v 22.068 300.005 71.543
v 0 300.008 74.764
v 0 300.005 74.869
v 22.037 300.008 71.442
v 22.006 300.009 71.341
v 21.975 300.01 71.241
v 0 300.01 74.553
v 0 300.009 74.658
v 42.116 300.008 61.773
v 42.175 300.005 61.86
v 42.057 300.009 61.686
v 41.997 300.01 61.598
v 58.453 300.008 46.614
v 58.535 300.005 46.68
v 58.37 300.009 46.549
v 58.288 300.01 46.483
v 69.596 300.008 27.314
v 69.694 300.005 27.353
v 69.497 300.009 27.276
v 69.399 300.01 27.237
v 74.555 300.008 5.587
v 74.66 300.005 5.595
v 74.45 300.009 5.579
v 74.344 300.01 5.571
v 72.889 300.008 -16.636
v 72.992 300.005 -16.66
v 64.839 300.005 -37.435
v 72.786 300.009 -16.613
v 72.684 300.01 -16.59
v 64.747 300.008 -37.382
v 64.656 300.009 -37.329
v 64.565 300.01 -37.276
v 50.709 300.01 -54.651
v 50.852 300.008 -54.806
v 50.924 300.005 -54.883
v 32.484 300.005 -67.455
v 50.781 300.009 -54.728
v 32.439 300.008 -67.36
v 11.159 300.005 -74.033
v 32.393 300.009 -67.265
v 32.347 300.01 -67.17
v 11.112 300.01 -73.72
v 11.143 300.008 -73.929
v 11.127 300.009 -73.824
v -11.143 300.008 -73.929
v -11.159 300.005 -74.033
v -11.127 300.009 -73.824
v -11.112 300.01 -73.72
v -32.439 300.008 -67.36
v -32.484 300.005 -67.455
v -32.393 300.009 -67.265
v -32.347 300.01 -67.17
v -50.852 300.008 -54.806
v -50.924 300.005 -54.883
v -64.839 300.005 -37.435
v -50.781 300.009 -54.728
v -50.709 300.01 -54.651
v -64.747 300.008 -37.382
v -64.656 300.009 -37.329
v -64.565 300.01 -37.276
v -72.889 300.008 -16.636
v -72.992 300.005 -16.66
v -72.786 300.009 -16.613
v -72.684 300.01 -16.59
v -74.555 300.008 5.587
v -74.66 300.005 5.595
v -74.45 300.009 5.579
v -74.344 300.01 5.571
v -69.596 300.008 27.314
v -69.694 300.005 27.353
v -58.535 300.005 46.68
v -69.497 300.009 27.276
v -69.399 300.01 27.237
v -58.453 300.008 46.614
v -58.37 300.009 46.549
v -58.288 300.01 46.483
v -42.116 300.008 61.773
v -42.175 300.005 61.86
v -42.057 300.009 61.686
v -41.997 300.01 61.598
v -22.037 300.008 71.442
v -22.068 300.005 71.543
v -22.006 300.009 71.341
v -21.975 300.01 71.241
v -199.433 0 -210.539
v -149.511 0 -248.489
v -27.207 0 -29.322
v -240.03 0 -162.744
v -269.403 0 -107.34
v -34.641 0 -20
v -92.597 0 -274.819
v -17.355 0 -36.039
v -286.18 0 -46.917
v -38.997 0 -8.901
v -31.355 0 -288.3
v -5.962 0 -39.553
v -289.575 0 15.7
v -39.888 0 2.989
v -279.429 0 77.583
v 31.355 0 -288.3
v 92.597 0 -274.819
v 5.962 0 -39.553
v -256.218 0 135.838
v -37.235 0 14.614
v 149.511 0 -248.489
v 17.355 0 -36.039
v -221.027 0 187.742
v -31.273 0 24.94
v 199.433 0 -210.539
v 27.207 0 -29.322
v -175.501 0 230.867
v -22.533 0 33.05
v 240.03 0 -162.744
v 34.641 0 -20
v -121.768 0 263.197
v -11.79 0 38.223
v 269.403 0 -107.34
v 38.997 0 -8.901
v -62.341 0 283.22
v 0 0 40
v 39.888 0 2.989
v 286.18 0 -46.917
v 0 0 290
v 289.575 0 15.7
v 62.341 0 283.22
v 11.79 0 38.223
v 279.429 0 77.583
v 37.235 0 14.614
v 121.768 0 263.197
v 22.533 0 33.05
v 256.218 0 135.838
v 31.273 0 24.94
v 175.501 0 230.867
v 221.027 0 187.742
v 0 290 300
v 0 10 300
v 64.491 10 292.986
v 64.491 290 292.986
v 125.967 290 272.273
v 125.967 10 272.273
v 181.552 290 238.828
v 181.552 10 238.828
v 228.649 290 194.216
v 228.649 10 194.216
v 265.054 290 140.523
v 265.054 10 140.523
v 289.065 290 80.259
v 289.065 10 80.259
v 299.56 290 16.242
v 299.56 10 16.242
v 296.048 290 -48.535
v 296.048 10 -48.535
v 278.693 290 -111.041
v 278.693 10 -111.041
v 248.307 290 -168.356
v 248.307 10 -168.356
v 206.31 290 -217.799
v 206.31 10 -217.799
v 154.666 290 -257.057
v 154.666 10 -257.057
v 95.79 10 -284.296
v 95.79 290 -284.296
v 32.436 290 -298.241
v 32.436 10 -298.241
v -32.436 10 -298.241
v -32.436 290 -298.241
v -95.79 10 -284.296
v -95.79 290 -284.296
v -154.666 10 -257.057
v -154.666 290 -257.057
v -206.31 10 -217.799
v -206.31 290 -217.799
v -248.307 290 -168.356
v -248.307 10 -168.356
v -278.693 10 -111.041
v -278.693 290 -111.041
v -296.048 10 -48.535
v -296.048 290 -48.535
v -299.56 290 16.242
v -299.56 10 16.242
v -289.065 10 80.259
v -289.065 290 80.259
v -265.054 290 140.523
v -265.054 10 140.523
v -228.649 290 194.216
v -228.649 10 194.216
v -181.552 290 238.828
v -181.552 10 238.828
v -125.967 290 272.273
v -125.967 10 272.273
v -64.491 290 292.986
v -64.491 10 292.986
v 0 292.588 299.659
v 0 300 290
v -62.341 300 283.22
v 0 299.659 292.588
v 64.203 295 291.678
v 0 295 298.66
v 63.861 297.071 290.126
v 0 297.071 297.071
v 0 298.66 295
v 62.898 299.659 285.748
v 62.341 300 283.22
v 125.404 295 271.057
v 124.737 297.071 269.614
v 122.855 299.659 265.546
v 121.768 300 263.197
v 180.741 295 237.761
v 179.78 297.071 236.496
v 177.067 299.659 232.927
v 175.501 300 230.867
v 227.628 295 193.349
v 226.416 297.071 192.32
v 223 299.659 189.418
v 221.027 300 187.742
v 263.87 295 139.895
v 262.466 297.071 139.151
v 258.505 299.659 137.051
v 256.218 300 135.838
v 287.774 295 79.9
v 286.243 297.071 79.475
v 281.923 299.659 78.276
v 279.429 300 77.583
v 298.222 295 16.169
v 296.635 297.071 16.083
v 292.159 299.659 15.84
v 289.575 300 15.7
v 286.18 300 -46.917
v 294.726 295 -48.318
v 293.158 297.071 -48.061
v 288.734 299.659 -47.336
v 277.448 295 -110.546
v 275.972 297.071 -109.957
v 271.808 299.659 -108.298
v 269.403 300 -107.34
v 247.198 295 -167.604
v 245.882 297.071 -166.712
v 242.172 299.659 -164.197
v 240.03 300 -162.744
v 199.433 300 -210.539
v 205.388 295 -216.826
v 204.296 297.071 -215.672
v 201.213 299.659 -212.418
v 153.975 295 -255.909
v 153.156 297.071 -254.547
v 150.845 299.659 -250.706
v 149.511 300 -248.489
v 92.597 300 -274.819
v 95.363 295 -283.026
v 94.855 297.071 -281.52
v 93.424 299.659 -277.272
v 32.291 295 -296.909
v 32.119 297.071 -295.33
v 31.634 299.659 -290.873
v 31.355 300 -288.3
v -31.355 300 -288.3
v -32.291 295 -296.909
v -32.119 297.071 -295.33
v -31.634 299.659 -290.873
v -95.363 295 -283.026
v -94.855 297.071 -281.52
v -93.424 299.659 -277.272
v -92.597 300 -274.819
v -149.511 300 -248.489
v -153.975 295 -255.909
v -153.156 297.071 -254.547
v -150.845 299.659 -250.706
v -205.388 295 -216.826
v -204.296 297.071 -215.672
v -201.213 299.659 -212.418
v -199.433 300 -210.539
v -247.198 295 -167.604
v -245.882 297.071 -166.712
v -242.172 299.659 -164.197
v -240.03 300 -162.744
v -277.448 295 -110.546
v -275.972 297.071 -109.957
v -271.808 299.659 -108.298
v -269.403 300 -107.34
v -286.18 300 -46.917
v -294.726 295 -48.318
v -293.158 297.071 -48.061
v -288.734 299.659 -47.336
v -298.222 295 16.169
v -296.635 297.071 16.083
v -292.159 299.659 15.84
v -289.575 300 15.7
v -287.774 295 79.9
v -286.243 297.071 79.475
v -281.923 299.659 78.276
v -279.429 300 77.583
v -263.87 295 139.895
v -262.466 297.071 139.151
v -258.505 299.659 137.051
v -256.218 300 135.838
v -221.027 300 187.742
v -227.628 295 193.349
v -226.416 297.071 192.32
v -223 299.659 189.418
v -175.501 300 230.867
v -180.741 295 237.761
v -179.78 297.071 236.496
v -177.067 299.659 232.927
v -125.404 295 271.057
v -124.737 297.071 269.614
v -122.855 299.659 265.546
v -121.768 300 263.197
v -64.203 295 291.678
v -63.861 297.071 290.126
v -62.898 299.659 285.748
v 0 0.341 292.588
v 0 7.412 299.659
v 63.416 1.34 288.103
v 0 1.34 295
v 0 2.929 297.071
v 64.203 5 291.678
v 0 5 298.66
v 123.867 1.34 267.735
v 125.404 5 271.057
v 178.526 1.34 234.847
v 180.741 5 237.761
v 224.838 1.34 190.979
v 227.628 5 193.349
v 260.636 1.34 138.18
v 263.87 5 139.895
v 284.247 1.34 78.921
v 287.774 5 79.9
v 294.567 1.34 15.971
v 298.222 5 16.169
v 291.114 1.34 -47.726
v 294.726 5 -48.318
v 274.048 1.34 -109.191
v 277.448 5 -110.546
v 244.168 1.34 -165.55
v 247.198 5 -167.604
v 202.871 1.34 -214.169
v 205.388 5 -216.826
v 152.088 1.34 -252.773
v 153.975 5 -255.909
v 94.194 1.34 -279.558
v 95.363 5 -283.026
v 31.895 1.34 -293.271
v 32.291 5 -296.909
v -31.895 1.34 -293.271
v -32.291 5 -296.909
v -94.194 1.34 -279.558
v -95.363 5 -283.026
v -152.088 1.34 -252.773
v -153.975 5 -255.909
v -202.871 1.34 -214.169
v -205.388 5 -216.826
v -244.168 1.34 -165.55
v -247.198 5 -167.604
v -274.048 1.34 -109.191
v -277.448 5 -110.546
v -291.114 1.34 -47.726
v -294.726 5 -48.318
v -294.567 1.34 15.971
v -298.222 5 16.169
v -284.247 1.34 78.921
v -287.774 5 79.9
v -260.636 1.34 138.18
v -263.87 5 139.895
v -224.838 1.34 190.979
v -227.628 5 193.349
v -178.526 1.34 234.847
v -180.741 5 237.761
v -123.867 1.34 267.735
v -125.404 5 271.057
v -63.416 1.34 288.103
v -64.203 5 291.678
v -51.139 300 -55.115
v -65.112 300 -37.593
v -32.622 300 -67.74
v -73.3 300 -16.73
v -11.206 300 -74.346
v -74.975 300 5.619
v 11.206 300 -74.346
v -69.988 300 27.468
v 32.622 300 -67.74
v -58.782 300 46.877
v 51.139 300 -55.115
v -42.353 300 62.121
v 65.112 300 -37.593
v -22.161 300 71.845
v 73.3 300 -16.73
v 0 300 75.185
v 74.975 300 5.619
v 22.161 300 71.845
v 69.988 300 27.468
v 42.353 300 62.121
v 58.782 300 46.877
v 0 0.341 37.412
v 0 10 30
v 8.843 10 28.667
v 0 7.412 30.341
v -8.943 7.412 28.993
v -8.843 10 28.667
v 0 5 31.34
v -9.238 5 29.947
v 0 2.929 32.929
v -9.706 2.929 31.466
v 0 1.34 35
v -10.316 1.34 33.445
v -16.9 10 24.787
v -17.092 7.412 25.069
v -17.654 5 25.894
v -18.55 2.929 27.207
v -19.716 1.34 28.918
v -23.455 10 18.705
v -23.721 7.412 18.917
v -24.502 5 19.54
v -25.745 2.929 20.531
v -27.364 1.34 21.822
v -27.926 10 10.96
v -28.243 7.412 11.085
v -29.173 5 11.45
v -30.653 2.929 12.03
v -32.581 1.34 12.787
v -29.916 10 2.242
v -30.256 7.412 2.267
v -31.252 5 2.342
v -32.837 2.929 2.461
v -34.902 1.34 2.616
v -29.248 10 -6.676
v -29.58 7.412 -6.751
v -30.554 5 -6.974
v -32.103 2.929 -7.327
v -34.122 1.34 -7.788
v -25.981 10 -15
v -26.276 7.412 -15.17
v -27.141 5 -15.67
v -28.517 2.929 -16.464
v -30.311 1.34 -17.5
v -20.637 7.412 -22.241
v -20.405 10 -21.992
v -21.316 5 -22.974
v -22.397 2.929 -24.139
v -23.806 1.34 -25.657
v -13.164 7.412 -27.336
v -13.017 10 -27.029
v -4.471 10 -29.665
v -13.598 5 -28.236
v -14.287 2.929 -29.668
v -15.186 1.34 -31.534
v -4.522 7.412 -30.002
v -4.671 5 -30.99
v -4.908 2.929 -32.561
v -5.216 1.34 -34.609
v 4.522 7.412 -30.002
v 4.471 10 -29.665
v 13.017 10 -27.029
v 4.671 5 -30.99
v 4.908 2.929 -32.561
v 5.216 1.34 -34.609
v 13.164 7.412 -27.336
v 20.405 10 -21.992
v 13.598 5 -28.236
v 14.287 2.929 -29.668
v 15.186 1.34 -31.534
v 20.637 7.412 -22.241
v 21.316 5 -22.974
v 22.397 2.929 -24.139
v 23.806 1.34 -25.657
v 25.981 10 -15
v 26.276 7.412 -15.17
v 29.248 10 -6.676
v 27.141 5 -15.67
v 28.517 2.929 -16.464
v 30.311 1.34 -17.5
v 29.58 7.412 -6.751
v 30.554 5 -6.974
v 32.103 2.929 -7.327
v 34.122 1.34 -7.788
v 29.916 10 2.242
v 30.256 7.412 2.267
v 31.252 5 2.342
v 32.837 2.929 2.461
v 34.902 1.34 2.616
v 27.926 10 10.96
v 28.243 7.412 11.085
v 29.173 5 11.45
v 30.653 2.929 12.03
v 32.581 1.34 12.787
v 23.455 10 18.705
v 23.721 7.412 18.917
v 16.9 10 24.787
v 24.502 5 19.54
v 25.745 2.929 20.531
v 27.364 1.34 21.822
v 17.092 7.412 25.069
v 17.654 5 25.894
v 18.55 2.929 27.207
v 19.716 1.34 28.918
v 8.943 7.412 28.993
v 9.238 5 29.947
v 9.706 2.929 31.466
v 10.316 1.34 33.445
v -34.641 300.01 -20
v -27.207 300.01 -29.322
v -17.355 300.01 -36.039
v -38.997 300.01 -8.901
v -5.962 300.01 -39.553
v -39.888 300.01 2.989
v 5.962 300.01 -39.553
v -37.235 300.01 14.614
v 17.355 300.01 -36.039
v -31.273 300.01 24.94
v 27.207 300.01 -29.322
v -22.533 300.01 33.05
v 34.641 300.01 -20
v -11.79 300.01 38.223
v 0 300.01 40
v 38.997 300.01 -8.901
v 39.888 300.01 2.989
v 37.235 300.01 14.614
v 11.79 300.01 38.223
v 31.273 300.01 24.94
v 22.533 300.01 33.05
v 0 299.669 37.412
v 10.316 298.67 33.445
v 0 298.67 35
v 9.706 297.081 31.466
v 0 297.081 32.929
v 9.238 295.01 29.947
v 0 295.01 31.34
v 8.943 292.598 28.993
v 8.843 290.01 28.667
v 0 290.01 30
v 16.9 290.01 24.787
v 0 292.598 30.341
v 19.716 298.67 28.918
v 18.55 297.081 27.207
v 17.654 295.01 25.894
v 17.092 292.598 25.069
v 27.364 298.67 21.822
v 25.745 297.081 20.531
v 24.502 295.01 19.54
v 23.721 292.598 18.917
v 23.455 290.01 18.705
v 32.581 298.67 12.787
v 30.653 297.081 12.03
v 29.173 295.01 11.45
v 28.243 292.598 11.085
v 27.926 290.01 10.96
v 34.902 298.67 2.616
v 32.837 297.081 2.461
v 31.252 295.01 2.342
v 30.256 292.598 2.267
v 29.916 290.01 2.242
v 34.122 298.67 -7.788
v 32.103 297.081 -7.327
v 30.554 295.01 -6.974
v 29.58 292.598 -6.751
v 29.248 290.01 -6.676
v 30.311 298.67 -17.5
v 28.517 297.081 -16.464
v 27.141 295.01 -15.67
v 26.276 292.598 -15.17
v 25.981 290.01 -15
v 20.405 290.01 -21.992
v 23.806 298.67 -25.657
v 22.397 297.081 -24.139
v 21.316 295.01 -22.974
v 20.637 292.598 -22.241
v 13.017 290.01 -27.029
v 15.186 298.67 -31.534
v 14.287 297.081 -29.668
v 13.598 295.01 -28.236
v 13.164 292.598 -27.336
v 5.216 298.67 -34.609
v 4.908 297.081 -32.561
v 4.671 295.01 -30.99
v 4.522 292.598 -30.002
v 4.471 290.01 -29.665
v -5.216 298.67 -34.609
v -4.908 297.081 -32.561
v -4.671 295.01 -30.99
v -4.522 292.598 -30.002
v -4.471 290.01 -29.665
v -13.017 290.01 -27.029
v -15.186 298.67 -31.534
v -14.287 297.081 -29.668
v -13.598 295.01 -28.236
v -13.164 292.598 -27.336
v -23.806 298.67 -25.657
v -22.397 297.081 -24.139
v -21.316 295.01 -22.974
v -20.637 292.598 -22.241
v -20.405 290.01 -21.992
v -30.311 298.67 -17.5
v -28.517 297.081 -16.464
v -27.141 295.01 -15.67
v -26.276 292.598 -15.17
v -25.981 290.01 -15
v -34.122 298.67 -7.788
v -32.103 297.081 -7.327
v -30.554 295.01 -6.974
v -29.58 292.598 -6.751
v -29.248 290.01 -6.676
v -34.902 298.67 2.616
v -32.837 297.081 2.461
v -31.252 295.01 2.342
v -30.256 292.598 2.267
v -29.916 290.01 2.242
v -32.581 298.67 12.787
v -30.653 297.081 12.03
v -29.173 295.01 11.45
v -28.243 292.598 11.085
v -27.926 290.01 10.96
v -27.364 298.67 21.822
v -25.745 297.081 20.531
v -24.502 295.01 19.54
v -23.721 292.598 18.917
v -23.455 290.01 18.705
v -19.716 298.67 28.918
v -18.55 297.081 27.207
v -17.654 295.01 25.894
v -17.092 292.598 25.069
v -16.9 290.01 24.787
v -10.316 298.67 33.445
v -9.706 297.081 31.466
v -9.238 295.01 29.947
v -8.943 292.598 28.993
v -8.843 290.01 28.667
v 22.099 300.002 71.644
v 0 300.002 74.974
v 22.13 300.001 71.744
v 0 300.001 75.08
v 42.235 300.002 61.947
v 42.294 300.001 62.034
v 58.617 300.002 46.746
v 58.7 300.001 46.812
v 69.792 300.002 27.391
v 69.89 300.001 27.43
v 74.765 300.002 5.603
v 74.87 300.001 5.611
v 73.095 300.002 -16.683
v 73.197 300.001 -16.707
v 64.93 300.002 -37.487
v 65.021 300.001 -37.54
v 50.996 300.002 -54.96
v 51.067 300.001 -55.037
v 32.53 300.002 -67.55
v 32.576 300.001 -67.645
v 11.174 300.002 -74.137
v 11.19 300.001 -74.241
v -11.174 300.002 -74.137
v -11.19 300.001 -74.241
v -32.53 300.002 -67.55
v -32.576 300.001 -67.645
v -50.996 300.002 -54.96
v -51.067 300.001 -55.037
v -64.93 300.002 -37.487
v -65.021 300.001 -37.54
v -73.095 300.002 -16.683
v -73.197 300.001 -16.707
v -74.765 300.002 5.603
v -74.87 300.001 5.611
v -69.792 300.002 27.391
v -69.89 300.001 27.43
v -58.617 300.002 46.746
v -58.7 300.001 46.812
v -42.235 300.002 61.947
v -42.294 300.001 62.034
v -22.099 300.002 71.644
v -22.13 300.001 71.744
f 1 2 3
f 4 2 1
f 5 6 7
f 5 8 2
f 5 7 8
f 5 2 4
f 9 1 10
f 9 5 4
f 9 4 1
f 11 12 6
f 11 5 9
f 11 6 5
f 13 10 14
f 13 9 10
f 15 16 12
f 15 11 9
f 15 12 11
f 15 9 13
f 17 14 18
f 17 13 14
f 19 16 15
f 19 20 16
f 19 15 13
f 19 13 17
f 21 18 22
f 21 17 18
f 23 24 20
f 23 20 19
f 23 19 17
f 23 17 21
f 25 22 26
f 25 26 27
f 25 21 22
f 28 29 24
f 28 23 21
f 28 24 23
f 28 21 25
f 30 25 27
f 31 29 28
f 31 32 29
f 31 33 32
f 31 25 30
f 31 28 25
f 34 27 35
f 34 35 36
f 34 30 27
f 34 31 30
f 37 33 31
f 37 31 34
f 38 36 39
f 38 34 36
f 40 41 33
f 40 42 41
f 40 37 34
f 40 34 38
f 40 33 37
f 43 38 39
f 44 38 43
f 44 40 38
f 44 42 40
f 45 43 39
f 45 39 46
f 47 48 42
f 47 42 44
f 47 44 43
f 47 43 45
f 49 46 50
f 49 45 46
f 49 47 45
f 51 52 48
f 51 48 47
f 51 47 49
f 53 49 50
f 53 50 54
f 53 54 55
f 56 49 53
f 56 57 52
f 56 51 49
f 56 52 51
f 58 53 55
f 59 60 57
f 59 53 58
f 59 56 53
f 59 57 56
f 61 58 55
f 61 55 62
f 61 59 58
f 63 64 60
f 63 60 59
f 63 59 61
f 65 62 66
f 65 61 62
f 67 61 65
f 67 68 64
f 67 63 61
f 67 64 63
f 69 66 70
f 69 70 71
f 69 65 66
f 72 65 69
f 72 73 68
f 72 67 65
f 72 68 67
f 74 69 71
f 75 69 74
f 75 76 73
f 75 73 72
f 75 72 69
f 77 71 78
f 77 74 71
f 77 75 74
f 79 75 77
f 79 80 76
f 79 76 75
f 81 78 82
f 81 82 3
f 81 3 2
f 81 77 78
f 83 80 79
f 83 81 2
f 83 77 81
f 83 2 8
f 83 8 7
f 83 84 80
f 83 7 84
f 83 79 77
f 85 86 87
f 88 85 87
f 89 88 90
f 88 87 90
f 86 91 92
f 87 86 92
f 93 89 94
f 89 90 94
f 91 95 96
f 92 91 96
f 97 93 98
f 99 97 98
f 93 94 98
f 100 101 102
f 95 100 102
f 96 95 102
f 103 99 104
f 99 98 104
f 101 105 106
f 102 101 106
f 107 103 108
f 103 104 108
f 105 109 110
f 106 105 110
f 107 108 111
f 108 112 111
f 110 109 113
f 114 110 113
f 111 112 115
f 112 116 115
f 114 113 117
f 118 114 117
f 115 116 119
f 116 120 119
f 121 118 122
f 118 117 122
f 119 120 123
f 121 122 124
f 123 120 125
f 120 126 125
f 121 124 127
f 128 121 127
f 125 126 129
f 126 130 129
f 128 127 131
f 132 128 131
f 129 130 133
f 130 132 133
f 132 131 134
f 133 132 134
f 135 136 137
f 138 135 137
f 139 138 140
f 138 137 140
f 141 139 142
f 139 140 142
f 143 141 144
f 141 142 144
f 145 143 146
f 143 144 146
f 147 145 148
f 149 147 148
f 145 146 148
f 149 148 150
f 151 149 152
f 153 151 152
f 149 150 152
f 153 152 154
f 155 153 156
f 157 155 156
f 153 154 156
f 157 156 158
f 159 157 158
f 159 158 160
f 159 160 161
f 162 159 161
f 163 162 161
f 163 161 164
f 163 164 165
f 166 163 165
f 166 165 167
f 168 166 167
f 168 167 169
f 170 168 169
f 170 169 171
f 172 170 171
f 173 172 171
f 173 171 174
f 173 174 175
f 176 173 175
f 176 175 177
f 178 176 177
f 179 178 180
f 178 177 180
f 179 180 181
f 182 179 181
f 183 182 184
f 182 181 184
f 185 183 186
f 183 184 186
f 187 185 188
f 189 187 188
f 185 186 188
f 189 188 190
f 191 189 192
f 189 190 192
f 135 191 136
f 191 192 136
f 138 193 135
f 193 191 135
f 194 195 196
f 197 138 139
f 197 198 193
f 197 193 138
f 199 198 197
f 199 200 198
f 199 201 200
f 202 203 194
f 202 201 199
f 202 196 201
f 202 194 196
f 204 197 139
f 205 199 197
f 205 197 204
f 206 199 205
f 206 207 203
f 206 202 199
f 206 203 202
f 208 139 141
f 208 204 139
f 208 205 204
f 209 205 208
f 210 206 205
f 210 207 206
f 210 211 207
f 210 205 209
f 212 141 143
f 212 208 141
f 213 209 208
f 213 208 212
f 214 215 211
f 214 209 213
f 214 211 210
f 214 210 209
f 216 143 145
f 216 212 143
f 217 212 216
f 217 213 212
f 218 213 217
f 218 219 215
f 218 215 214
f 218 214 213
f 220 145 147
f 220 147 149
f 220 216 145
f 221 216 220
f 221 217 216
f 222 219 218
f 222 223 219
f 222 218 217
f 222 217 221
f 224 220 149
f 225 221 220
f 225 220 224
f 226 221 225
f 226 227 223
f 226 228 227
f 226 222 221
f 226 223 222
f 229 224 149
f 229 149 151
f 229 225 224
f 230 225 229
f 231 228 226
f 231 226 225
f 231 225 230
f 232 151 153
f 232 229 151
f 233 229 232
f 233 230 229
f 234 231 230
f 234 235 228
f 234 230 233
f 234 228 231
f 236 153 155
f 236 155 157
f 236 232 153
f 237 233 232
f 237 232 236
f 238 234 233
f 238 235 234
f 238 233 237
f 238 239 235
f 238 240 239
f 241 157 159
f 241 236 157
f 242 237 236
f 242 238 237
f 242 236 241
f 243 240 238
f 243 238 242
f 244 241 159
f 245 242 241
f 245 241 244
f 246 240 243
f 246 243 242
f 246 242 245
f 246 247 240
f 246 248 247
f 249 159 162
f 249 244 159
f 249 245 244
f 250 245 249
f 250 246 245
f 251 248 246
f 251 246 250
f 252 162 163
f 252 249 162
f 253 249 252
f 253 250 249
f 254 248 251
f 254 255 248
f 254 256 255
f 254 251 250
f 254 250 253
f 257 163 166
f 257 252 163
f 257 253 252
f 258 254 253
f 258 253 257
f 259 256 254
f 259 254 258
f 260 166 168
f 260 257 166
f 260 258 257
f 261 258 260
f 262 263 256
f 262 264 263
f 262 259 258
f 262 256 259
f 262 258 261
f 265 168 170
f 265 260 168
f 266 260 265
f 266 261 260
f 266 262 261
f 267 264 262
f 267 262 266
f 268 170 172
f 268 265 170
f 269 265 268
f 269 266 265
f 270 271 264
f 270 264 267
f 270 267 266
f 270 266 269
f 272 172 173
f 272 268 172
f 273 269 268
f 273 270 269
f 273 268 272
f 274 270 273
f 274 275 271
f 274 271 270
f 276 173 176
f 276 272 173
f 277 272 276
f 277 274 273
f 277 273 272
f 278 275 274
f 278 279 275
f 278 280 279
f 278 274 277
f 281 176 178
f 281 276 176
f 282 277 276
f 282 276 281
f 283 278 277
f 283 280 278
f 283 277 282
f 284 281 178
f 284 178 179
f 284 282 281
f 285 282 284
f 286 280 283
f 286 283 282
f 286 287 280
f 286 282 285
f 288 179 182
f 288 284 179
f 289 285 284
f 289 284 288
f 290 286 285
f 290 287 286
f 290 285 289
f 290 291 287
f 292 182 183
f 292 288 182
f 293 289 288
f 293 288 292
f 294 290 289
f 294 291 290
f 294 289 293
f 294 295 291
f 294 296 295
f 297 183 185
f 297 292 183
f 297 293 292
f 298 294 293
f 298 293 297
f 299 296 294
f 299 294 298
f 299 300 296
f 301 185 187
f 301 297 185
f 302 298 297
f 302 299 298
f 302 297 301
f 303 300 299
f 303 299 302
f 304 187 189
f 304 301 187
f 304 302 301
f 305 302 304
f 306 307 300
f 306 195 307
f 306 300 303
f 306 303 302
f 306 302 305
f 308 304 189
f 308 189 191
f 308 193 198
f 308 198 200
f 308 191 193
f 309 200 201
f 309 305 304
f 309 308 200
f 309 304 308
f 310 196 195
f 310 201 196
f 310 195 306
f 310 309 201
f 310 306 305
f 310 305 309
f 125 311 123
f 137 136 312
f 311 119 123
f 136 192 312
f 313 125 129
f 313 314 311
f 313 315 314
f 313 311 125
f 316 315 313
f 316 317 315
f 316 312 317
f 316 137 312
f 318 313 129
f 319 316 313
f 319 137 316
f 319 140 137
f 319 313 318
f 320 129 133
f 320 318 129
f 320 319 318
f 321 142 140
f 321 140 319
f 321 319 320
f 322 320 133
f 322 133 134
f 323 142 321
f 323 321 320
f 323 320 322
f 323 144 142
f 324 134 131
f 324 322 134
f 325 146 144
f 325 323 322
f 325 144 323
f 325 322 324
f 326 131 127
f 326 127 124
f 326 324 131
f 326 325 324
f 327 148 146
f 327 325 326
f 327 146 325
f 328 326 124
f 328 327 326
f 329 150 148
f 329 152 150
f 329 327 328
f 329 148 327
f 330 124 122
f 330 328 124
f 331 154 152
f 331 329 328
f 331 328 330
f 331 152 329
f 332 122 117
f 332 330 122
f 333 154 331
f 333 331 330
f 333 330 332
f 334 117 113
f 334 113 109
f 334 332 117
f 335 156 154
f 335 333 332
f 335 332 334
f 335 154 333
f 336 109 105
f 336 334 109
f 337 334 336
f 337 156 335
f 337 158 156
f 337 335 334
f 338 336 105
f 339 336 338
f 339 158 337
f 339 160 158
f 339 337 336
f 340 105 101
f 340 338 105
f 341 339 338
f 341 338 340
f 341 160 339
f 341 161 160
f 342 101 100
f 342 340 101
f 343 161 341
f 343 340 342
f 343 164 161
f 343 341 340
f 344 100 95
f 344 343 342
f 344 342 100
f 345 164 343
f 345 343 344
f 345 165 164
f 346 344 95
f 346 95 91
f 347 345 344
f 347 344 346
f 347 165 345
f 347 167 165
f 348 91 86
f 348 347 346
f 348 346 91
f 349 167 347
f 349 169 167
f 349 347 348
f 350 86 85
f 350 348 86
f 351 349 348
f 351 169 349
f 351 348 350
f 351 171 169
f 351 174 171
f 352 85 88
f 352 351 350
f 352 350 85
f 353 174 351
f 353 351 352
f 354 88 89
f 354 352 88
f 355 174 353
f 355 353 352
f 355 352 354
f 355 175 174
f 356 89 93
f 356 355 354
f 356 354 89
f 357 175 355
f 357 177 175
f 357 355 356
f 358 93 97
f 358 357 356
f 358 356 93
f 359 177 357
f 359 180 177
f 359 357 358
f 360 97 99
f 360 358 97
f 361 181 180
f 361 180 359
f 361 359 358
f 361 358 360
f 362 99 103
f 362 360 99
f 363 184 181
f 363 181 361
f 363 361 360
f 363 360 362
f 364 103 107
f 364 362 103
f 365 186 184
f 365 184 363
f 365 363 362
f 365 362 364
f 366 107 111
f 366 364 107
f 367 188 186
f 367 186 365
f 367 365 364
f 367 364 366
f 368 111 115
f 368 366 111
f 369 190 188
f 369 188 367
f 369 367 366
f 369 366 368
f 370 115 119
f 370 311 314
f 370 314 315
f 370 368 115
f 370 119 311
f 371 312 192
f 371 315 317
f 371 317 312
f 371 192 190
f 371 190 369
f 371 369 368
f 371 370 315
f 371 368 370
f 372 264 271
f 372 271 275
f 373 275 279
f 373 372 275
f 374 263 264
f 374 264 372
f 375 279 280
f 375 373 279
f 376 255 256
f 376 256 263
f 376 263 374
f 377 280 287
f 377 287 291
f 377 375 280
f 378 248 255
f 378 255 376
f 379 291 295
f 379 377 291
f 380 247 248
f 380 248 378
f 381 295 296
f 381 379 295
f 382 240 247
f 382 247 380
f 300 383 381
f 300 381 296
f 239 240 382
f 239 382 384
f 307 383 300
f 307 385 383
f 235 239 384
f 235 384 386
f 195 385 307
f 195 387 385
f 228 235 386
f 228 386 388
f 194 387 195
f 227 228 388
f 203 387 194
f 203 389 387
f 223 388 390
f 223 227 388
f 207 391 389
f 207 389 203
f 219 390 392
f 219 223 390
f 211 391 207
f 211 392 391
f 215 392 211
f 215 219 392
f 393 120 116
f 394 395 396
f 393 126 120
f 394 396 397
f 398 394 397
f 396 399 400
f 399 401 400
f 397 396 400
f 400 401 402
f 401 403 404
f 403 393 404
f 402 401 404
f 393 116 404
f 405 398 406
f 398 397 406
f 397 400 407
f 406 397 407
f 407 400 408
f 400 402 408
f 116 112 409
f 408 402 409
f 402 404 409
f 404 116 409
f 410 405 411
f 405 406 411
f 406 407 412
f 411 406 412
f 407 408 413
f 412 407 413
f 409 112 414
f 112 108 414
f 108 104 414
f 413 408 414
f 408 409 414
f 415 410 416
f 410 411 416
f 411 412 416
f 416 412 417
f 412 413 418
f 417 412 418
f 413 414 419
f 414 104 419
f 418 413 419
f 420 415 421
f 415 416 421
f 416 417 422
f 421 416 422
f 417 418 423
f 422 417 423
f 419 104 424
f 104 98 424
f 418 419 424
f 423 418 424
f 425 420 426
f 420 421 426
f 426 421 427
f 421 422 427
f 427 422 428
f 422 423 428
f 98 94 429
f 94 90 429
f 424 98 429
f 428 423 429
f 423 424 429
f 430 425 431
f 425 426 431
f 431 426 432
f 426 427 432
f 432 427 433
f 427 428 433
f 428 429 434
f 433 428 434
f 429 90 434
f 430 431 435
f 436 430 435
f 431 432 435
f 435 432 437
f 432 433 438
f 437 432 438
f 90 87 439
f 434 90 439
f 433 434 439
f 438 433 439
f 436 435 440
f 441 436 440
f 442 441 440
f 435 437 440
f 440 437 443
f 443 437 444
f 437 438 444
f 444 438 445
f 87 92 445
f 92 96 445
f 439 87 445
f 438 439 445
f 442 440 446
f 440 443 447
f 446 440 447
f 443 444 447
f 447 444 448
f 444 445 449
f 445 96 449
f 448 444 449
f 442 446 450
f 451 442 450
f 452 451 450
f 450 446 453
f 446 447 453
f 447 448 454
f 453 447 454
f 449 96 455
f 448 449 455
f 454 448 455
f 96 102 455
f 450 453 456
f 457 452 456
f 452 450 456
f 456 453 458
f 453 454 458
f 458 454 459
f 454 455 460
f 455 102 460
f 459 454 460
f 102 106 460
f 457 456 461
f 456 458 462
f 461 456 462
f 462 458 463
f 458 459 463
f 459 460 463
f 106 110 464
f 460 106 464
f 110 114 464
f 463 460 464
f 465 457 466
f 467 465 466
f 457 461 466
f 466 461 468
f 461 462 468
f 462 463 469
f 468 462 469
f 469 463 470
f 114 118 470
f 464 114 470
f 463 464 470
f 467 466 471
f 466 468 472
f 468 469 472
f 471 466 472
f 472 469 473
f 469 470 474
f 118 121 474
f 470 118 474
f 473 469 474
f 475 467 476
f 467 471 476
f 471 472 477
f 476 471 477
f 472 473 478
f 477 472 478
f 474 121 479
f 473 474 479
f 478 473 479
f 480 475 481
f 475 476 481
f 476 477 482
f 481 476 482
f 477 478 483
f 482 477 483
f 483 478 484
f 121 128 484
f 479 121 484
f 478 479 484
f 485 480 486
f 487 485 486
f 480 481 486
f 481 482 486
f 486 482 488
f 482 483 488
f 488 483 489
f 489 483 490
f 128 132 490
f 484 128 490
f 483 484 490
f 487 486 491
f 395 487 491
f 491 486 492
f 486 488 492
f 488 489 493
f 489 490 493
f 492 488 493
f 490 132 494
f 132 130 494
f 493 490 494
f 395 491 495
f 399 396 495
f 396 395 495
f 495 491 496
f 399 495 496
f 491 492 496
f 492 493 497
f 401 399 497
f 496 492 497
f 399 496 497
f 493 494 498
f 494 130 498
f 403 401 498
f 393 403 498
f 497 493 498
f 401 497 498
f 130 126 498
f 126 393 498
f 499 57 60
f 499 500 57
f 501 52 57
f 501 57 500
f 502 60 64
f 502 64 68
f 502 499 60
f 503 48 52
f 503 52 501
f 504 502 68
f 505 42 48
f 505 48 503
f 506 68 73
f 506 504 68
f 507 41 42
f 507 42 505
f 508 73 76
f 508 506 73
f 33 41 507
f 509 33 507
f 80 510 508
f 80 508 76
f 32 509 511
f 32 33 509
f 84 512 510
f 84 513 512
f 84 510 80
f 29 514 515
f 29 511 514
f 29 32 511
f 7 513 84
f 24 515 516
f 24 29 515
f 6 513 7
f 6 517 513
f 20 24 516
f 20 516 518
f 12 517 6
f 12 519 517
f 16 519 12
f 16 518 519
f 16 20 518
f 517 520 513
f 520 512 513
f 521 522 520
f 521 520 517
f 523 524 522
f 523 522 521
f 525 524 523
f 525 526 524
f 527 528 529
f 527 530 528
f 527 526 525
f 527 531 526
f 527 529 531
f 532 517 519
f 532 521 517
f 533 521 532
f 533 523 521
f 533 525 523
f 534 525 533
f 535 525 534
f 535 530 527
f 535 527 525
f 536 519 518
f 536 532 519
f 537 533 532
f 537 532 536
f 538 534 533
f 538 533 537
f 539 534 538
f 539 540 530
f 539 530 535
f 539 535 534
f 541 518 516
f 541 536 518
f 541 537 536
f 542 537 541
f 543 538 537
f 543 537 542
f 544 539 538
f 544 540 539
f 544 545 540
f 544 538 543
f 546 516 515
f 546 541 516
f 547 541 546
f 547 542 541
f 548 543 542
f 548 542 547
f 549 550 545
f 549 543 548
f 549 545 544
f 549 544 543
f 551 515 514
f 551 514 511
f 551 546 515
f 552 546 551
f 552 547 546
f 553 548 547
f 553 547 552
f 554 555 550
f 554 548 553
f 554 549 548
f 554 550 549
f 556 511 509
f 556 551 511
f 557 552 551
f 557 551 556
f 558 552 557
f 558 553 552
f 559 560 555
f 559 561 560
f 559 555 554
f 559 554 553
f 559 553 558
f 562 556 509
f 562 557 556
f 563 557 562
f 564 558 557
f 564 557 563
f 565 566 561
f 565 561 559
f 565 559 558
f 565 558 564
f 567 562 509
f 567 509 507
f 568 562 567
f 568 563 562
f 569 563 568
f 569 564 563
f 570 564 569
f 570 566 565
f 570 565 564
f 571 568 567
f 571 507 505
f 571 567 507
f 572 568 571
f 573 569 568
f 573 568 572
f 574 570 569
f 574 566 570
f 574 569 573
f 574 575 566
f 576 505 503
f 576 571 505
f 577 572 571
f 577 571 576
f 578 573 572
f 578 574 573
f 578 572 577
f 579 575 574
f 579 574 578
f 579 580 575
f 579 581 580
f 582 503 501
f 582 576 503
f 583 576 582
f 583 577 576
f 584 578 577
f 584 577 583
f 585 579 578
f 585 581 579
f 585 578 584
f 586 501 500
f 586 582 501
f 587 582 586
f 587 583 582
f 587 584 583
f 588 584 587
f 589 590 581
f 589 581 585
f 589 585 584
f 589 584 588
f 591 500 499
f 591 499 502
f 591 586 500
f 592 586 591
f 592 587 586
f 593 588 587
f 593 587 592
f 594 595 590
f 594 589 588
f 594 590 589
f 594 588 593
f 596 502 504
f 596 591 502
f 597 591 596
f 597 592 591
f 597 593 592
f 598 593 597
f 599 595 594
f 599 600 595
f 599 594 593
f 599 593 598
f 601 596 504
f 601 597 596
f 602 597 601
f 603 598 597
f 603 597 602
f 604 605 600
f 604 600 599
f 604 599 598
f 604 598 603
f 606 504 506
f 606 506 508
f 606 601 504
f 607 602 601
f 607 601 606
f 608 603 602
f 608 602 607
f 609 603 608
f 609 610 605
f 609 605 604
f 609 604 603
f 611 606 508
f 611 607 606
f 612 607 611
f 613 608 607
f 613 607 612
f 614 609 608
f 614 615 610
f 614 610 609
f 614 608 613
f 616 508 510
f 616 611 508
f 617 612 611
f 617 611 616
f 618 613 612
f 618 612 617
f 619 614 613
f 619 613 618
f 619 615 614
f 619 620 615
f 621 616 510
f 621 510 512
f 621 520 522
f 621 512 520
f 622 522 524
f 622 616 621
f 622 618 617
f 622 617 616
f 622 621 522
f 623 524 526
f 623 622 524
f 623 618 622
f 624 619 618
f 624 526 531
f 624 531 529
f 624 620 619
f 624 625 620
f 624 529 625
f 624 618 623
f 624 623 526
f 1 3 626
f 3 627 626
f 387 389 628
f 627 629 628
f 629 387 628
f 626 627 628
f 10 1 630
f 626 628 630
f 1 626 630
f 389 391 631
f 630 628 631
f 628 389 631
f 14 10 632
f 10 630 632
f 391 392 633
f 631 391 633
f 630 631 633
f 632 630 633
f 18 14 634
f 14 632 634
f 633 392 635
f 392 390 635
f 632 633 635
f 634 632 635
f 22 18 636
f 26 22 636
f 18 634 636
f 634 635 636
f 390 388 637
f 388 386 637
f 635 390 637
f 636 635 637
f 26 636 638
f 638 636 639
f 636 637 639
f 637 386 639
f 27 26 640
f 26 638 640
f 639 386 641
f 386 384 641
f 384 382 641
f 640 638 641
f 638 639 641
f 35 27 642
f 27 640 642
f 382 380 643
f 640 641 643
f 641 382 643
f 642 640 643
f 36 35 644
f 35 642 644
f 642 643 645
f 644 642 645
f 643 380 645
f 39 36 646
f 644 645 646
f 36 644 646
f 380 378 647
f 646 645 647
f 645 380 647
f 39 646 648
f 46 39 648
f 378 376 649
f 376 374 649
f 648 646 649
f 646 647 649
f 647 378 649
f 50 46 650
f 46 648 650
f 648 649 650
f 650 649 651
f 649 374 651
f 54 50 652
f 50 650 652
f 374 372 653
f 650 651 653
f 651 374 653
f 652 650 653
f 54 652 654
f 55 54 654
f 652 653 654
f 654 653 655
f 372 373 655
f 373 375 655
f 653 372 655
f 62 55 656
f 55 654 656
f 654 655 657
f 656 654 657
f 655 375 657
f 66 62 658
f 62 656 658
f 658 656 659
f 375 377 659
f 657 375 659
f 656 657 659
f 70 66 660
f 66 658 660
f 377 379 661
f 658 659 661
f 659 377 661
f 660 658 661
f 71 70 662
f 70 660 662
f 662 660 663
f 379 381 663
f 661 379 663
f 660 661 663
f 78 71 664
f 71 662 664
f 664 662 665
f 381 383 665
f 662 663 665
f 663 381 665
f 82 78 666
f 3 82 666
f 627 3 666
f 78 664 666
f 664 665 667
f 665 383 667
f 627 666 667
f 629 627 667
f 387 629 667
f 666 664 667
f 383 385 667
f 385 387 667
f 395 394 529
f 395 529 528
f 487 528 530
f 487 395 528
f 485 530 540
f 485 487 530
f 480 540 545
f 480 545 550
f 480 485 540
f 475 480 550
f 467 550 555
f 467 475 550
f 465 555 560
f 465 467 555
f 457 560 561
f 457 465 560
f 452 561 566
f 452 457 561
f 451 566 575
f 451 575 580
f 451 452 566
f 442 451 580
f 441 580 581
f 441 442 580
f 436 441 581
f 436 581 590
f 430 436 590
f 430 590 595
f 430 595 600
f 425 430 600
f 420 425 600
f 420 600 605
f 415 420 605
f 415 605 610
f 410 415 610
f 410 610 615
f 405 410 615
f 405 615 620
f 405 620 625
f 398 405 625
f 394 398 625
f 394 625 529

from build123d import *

# Parameters (mm, degrees)
SKETCH1_R                = 300.00000000000006
SKETCH1_R_2              = 75.00000000000001
BOSS_EXTRUDE2_DEPTH      = 300
BOSS_EXTRUDE3_DEPTH      = 0.01
BOSS_EXTRUDE3_DEPTH_BACK = 300
SKETCH2_R                = 75.00000000000003
CUT_EXTRUDE1_DEPTH       = 520.6210158375045
CUT_EXTRUDE1_DEPTH_BACK  = 520.6210158375045
SKETCH3_R                = 30
FILLET1_R                = 10
FILLET2_R                = 10
FILLET3_R                = 10


with BuildPart() as part:
    # Sketch1 → Boss-Extrude2 (new body)
    with BuildSketch(Plane(origin=(0, 0, 0), x_dir=(1, 0, 0), z_dir=(0, 1, 0))):
        with Locations(Location((0, 0, 0), (0, 0, 270))):
            Circle(SKETCH1_R)
        with Locations(Location((0, 0, 0), (0, 0, 270))):
            Circle(SKETCH1_R_2, mode=Mode.SUBTRACT)
    extrude(amount=BOSS_EXTRUDE2_DEPTH)

    # Sketch2 → Boss-Extrude3 (add, two sides: drawn at the far end of the back side and taken through both)
    with BuildSketch(Plane(origin=(0, 300, 0), x_dir=(1, 0, 0), z_dir=(0, 1, 0)).offset(-BOSS_EXTRUDE3_DEPTH_BACK)):
        with Locations(Location((0, 0, 0), (0, 0, 270))):
            Circle(SKETCH2_R)
    extrude(amount=BOSS_EXTRUDE3_DEPTH + BOSS_EXTRUDE3_DEPTH_BACK)

    # Sketch3 → Cut-Extrude1 (cut, two sides: drawn at the far end of the back side and taken through both)
    with BuildSketch(Plane(origin=(0, 300.01, 0), x_dir=(1, 0, 0), z_dir=(0, 1, 0)).offset(-CUT_EXTRUDE1_DEPTH_BACK)):
        with Locations(Location((0, 0, 0), (0, 0, 270))):
            Circle(SKETCH3_R)
    extrude(amount=CUT_EXTRUDE1_DEPTH + CUT_EXTRUDE1_DEPTH_BACK, mode=Mode.SUBTRACT)

    # Fillet1
    # the kernel refuses this fillet: 10 mm, written as the material it takes off along each edge
    with BuildSketch(Plane(origin=(0, 300.01, 0), x_dir=(-1.8e-16, 0, 1), z_dir=(-1, 0, -1.8e-16))) as fillet1_piece_1:
        with BuildLine():
            CenterArc((74.55289822187787, -10), FILLET1_R, 87.43744126687696, 2.5625587331230406)
            Line((74.55289822187787, 0), (75.00000000000003, 0))
            Line((75.00000000000003, 0), (75.00000000000001, -0.00999999999999091))
        make_face()
    revolve(axis=Axis((0, 300.01, 0), (0, 1, 0)), mode=Mode.SUBTRACT)
    with BuildSketch(Plane(origin=(0, 300.01, 0), x_dir=(-1.8e-16, 0, 1), z_dir=(-1, 0, -1.8e-16))) as fillet1_piece_2:
        with BuildLine():
            CenterArc((30 + FILLET1_R, -FILLET1_R), FILLET1_R, 90, 90)
            Line((30 + FILLET1_R, 0), (30, 0))
            Line((30, 0), (30, -FILLET1_R))
        make_face()
    revolve(axis=Axis((0, 300.01, 0), (0, 1, 0)), mode=Mode.SUBTRACT)
    with BuildSketch(Plane(origin=(0, 0, 0), x_dir=(-1.8e-16, 0, 1), z_dir=(-1, 0, -1.8e-16))) as fillet1_piece_3:
        with BuildLine():
            CenterArc((300.00000000000006 - FILLET1_R, FILLET1_R), FILLET1_R, 270, 90)
            Line((300.00000000000006 - FILLET1_R, -1.78e-15), (300.00000000000006, 0))
            Line((300.00000000000006, 0), (300.00000000000006, FILLET1_R))
        make_face()
    revolve(axis=Axis((0, 0, 0), (0, 1, 0)), mode=Mode.SUBTRACT)
    with BuildSketch(Plane(origin=(0, 300, 0), x_dir=(-1.8e-16, 0, 1), z_dir=(-1, 0, -1.8e-16))) as fillet1_piece_4:
        with BuildLine():
            CenterArc((300.00000000000006 - FILLET1_R, -FILLET1_R), FILLET1_R, 0, 90)
            Line((300.00000000000006 - FILLET1_R, 0), (300.00000000000006, 0))
            Line((300.00000000000006, 0), (300.00000000000006, -FILLET1_R))
        make_face()
    revolve(axis=Axis((0, 300, 0), (0, 1, 0)), mode=Mode.SUBTRACT)

    # Fillet2
    # the kernel refuses this fillet: 10 mm, written as the material it adds along each edge
    with BuildSketch(Plane(origin=(0, 300, 0), x_dir=(-1.8e-16, 0, 1), z_dir=(-1, 0, -1.8e-16))) as fillet2_piece_1:
        with BuildLine():
            CenterArc((75.18527469203002, 10), FILLET2_R, 268.1880728619216, 1.8119271380783744)
            ThreePointArc((74.86908645695401, 0.00499999999999545), (74.93455141662679, 0.00271438793976131), (75.00000000000001, 0))
            Line((75.00000000000001, 0), (75.18527469203002, 0))
        make_face()
    revolve(axis=Axis((0, 300, 0), (0, 1, 0)))

    # Fillet3
    fillet3_edges = [part.edges().sort_by_distance(p)[0] for p in [
        (2.251e-14, 0, -30),
    ]]
    fillet(fillet3_edges, radius=FILLET3_R)


solid = part.part
